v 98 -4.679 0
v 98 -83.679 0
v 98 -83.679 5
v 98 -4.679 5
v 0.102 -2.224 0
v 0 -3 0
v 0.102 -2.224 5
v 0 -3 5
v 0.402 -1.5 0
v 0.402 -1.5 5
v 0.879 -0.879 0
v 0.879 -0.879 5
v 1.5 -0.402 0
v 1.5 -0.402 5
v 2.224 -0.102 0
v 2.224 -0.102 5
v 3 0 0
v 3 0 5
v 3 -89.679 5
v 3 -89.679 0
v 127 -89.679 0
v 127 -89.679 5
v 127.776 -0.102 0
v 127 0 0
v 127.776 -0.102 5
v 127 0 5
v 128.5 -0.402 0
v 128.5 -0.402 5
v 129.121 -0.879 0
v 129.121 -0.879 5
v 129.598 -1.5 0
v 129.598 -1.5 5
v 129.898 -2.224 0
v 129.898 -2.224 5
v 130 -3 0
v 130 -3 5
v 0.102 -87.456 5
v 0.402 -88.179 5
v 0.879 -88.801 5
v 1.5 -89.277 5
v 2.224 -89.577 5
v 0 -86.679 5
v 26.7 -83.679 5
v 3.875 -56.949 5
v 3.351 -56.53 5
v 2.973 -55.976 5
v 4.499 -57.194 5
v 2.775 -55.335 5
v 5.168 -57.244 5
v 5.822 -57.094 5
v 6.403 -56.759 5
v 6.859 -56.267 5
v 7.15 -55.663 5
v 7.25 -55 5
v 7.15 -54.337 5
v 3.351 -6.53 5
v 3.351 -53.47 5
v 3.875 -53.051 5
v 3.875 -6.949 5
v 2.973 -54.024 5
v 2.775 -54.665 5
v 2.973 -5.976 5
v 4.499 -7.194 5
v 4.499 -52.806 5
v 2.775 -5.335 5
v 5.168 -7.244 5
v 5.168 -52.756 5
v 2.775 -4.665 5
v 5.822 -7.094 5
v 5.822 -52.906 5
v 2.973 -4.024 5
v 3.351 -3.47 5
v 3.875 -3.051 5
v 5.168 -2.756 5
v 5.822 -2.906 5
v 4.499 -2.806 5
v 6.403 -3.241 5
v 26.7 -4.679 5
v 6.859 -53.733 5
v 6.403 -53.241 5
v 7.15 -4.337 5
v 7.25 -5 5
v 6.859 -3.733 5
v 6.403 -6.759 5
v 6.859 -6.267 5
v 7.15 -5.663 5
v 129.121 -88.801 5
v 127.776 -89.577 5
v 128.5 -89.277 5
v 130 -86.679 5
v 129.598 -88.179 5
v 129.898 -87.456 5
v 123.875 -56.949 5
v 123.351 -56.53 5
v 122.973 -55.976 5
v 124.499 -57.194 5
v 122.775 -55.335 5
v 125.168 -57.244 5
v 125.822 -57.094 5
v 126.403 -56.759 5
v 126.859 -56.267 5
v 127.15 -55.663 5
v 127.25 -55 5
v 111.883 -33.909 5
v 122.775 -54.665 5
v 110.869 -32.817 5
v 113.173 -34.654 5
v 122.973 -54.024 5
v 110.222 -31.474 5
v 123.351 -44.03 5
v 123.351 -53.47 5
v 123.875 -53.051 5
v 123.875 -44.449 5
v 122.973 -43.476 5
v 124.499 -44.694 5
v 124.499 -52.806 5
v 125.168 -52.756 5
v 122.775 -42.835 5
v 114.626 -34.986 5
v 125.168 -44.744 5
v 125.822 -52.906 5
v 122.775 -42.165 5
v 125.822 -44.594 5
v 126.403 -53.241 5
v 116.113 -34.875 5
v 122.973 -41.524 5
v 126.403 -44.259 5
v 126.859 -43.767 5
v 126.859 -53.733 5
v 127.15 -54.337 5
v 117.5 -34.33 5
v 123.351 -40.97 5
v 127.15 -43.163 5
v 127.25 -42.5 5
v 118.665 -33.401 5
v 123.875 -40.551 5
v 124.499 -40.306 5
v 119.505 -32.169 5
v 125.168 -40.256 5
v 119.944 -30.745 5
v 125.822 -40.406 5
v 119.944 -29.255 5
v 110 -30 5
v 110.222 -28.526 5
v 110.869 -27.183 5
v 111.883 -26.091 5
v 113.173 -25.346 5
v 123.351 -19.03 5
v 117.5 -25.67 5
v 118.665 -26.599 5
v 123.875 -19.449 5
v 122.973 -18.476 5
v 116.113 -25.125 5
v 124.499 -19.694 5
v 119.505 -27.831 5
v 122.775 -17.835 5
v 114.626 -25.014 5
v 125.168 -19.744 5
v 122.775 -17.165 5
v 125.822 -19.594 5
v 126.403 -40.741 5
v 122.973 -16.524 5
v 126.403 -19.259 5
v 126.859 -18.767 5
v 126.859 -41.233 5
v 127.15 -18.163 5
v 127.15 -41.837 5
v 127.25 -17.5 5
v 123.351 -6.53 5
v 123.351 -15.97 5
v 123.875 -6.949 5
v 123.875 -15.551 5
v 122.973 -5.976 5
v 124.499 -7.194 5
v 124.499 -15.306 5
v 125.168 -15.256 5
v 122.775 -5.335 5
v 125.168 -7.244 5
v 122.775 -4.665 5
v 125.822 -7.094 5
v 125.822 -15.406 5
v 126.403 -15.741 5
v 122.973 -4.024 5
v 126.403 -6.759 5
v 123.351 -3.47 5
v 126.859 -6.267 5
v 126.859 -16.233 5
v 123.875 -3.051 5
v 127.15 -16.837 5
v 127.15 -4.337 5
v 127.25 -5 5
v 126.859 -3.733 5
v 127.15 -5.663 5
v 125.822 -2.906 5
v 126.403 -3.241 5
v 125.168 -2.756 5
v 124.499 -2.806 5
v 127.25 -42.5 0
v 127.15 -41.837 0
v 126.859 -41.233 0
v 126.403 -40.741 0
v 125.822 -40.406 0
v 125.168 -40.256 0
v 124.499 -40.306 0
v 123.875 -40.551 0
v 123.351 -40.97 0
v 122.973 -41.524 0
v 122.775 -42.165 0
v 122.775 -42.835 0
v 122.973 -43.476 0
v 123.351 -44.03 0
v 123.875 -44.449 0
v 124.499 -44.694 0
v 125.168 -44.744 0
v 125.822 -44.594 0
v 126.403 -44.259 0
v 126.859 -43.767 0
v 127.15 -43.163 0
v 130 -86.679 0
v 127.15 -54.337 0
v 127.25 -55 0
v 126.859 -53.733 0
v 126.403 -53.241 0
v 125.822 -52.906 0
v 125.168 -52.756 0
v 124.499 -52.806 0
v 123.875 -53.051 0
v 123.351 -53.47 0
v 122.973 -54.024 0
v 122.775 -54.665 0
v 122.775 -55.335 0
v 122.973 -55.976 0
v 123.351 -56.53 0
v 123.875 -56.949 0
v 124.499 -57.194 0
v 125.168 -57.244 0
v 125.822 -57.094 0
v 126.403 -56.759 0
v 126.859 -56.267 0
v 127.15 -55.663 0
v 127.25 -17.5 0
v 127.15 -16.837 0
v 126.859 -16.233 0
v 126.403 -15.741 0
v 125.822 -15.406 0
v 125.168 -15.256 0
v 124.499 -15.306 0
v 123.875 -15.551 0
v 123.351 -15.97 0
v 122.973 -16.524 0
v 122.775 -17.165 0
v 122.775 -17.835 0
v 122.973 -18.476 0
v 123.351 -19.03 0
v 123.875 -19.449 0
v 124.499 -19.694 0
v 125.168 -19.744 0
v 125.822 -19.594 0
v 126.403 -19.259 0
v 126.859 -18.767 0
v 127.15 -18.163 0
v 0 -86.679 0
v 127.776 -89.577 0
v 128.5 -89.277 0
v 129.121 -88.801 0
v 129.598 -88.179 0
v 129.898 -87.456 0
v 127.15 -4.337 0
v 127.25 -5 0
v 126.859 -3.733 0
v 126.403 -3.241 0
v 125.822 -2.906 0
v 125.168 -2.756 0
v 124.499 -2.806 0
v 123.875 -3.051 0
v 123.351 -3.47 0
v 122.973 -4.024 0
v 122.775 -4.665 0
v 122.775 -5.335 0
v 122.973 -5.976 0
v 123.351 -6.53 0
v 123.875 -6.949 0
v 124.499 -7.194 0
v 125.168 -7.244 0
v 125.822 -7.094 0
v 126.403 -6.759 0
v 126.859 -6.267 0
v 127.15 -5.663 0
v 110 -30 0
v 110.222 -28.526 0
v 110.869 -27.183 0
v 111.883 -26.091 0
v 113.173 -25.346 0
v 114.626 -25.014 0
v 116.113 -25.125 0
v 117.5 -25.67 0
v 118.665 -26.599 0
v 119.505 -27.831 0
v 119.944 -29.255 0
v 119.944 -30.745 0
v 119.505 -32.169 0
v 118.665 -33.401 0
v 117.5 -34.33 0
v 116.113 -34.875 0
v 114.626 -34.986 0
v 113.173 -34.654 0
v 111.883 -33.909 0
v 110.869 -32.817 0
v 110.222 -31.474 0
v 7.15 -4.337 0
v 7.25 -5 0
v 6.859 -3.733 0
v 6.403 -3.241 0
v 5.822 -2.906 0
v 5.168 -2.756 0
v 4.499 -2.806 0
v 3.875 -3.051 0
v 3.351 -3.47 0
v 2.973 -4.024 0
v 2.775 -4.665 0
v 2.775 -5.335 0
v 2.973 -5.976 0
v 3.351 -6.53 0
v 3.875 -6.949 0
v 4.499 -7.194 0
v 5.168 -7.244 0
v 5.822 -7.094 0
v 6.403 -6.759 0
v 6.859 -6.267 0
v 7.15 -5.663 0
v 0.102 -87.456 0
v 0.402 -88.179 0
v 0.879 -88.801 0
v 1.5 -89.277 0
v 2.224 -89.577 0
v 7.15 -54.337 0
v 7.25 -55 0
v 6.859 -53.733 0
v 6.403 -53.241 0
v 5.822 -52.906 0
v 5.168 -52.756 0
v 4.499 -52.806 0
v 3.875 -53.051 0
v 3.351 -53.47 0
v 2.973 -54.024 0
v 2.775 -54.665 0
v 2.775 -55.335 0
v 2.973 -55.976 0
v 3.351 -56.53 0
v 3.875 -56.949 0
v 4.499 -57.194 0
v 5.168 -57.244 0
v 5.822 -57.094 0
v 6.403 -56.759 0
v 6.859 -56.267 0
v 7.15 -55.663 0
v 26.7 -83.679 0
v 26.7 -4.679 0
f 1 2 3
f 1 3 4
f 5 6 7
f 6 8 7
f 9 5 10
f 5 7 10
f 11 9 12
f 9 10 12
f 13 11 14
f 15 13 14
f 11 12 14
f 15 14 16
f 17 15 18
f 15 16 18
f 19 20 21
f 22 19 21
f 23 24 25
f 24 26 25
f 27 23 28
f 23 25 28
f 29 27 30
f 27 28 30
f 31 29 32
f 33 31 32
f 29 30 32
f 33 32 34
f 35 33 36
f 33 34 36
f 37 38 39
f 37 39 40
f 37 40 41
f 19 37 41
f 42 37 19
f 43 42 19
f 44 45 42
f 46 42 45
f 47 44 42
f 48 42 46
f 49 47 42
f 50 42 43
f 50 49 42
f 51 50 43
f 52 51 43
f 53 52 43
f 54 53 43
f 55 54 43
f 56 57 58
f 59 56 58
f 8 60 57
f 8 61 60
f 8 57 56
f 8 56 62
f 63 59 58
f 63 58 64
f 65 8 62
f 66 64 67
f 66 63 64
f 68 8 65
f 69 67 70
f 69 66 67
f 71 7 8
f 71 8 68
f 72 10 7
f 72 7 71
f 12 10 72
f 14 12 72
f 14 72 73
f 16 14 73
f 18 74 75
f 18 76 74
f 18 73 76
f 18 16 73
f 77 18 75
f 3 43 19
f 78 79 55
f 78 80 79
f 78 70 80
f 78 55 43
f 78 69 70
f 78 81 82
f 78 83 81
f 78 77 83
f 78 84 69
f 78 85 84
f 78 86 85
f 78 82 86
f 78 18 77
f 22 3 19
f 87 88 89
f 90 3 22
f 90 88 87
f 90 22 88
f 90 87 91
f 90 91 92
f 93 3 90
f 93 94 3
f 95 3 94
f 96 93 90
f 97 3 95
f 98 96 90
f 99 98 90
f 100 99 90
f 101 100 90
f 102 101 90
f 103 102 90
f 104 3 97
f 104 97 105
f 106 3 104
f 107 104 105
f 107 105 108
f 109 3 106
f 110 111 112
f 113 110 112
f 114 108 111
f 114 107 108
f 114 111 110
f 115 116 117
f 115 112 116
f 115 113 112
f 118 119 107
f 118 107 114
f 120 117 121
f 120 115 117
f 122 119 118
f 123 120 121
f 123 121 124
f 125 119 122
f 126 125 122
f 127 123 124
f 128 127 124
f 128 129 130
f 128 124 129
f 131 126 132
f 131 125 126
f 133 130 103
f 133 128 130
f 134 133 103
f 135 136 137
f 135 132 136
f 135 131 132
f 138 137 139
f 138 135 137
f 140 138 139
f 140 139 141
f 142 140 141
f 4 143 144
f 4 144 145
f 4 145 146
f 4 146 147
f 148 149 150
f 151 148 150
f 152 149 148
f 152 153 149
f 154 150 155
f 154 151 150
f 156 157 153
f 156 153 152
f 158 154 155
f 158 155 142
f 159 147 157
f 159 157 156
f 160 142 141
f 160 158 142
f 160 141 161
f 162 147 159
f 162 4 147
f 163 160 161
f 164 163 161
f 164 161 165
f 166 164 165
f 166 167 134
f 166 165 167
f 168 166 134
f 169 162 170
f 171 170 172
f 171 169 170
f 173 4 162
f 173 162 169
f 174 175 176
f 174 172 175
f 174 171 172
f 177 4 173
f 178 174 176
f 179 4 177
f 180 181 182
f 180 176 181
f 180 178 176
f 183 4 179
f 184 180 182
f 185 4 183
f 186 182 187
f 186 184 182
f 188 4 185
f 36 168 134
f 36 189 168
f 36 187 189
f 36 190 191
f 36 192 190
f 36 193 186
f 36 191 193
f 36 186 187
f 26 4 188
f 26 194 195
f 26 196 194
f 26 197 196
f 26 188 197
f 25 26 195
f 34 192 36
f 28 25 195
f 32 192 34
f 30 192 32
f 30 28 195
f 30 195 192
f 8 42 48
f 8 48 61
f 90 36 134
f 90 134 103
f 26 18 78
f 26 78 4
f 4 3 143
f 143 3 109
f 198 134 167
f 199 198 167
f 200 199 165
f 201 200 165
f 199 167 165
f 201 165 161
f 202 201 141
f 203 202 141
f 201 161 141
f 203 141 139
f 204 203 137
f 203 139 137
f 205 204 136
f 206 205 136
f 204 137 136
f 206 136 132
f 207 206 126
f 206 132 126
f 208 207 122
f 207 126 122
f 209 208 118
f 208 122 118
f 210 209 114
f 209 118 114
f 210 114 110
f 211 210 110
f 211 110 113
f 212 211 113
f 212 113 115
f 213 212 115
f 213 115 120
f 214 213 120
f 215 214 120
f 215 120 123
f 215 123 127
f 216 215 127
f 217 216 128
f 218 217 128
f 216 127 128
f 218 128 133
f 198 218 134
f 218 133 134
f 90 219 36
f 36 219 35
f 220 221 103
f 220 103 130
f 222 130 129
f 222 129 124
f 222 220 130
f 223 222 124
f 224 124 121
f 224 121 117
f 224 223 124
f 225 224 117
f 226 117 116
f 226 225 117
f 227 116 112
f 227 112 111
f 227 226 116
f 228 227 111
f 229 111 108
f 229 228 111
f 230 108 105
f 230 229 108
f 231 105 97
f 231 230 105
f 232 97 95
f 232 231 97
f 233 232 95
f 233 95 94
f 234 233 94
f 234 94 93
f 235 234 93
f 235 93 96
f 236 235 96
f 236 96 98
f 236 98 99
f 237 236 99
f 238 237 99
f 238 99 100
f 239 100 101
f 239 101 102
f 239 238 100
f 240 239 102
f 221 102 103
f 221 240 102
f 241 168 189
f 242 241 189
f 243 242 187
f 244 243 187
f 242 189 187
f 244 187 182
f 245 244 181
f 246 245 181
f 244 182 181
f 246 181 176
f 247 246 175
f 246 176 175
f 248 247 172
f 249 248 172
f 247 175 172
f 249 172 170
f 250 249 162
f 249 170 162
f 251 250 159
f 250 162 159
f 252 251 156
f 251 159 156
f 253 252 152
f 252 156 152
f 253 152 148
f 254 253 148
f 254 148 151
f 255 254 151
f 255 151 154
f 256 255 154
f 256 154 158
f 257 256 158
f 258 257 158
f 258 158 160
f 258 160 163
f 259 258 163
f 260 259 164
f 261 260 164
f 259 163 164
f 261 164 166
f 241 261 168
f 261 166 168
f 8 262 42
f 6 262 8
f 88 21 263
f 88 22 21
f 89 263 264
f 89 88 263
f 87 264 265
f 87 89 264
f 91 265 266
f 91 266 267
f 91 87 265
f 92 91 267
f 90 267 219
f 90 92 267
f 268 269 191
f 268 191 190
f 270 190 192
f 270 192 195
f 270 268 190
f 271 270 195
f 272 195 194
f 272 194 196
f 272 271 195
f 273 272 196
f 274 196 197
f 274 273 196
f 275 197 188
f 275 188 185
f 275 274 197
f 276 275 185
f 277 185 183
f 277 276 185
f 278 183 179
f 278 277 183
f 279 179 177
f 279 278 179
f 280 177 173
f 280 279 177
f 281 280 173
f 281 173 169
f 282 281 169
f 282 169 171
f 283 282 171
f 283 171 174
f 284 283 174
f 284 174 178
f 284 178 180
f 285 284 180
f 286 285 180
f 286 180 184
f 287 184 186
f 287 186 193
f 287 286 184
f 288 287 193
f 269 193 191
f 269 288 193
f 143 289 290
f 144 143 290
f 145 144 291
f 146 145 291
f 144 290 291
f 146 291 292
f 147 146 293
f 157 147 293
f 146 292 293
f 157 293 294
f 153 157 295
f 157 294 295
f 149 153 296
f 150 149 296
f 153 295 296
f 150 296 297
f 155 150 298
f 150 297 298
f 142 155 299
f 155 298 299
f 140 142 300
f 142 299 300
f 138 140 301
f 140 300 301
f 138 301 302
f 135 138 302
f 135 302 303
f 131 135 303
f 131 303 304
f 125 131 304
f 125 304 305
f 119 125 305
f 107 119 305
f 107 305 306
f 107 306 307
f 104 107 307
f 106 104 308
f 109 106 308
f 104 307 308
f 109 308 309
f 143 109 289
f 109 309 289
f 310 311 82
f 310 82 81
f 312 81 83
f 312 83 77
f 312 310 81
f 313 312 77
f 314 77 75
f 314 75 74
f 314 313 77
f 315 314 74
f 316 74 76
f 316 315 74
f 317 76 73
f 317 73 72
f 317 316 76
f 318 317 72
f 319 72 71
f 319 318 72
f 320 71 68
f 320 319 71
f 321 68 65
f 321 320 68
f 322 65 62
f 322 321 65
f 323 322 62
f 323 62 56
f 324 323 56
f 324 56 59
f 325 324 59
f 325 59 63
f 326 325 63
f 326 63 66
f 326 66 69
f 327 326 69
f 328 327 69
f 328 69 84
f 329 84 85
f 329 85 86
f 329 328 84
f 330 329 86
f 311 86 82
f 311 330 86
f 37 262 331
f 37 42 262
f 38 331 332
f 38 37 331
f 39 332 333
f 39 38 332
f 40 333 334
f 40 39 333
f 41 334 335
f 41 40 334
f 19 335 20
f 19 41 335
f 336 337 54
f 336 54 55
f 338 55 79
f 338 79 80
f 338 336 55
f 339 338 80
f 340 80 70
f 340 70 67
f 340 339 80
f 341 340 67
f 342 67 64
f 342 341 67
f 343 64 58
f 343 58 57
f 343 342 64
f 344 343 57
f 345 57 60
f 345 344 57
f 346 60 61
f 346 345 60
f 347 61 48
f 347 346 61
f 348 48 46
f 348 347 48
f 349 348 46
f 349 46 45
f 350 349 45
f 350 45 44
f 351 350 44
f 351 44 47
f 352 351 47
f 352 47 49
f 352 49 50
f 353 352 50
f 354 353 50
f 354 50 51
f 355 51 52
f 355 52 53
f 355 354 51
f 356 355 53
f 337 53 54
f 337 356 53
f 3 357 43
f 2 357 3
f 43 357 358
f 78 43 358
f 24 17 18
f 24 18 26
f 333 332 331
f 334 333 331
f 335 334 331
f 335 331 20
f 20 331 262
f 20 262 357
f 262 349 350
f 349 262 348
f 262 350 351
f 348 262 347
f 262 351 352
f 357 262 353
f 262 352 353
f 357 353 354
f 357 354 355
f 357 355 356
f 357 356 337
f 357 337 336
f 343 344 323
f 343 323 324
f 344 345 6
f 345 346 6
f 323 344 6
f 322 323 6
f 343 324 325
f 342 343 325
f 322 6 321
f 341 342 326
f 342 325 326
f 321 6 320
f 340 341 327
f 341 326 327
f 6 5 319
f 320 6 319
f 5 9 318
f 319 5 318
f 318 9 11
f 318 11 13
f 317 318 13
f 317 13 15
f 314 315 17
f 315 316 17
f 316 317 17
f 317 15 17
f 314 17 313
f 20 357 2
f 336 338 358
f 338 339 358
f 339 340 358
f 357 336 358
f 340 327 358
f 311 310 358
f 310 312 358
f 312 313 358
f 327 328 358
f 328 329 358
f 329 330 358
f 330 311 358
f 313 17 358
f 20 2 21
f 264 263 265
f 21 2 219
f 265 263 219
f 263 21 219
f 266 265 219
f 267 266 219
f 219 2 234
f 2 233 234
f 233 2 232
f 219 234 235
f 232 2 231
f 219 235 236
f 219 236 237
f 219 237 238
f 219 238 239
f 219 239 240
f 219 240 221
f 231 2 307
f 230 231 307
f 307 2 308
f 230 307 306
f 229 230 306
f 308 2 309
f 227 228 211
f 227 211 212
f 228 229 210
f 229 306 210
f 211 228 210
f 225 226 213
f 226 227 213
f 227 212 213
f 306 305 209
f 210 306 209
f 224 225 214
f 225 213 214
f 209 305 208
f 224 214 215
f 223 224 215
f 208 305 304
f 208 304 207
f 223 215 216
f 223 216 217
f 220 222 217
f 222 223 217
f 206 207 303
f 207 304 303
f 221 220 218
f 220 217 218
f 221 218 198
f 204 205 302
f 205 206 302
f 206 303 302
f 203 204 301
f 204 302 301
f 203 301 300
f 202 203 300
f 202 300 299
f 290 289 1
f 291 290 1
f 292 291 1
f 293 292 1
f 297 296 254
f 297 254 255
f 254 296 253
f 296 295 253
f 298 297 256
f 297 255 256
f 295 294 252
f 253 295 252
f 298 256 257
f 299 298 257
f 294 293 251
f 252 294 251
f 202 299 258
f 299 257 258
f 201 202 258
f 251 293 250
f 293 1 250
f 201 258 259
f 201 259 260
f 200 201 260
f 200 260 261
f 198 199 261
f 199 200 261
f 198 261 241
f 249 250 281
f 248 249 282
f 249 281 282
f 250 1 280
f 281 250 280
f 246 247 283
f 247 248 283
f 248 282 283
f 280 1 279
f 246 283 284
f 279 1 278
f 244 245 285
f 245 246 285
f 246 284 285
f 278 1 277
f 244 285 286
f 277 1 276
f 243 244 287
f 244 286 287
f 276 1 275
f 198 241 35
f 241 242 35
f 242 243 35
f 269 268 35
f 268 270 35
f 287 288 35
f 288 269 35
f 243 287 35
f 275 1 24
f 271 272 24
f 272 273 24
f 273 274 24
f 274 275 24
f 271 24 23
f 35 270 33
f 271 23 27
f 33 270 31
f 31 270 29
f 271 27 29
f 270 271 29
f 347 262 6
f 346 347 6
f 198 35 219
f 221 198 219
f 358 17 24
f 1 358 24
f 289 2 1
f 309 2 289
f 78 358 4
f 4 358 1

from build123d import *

# Parameters (mm, degrees)
SKETCH1_W           = 130
SKETCH1_H           = 89.679378249
SKETCH1_R           = 2.25
SKETCH1_W_2         = 71.3
SKETCH1_H_2         = 79
BOSS_EXTRUDE1_DEPTH = 5
FILLET1_R           = 3
SKETCH2_R           = 5
CUT_EXTRUDE1_DEPTH  = 5
SKETCH3_R           = 2.25
CUT_EXTRUDE2_DEPTH  = 5


with BuildPart() as part:
    # Sketch1 → Boss-Extrude1 (new body)
    with BuildSketch(Plane.XY):
        with Locations((65, -44.839689125)):
            Rectangle(SKETCH1_W, SKETCH1_H)
        with Locations((125, -5)):
            Circle(SKETCH1_R, mode=Mode.SUBTRACT)
        with Locations((125, -55)):
            Circle(SKETCH1_R, mode=Mode.SUBTRACT)
        with Locations((5, -55)):
            Circle(SKETCH1_R, mode=Mode.SUBTRACT)
        with Locations((5, -5)):
            Circle(SKETCH1_R, mode=Mode.SUBTRACT)
        with Locations((62.35, -44.179378249)):
            Rectangle(SKETCH1_W_2, SKETCH1_H_2, mode=Mode.SUBTRACT)
    extrude(amount=BOSS_EXTRUDE1_DEPTH)

    # Fillet1
    fillet1_edges = [part.edges().sort_by_distance(p)[0] for p in [
        (0, 0, 2.5),
        (130, 0, 2.5),
        (130, -89.679378249, 2.5),
        (0, -89.679378249, 2.5),
    ]]
    fillet(fillet1_edges, radius=FILLET1_R)

    # Sketch2 → Cut-Extrude1 (cut)
    with BuildSketch(Plane(origin=(0, 0, 0), x_dir=(-1, 0, 0), z_dir=(0, 0, -1))):
        with Locations((-115, -30)):
            Circle(SKETCH2_R)
    extrude(amount=-CUT_EXTRUDE1_DEPTH, mode=Mode.SUBTRACT)

    # Sketch3 → Cut-Extrude2 (cut)
    with BuildSketch(Plane.XY.offset(5)):
        with Locations((125, -42.5)):
            Circle(SKETCH3_R)
        with Locations((125, -17.5)):
            Circle(SKETCH3_R)
    extrude(amount=-CUT_EXTRUDE2_DEPTH, mode=Mode.SUBTRACT)


solid = part.part
